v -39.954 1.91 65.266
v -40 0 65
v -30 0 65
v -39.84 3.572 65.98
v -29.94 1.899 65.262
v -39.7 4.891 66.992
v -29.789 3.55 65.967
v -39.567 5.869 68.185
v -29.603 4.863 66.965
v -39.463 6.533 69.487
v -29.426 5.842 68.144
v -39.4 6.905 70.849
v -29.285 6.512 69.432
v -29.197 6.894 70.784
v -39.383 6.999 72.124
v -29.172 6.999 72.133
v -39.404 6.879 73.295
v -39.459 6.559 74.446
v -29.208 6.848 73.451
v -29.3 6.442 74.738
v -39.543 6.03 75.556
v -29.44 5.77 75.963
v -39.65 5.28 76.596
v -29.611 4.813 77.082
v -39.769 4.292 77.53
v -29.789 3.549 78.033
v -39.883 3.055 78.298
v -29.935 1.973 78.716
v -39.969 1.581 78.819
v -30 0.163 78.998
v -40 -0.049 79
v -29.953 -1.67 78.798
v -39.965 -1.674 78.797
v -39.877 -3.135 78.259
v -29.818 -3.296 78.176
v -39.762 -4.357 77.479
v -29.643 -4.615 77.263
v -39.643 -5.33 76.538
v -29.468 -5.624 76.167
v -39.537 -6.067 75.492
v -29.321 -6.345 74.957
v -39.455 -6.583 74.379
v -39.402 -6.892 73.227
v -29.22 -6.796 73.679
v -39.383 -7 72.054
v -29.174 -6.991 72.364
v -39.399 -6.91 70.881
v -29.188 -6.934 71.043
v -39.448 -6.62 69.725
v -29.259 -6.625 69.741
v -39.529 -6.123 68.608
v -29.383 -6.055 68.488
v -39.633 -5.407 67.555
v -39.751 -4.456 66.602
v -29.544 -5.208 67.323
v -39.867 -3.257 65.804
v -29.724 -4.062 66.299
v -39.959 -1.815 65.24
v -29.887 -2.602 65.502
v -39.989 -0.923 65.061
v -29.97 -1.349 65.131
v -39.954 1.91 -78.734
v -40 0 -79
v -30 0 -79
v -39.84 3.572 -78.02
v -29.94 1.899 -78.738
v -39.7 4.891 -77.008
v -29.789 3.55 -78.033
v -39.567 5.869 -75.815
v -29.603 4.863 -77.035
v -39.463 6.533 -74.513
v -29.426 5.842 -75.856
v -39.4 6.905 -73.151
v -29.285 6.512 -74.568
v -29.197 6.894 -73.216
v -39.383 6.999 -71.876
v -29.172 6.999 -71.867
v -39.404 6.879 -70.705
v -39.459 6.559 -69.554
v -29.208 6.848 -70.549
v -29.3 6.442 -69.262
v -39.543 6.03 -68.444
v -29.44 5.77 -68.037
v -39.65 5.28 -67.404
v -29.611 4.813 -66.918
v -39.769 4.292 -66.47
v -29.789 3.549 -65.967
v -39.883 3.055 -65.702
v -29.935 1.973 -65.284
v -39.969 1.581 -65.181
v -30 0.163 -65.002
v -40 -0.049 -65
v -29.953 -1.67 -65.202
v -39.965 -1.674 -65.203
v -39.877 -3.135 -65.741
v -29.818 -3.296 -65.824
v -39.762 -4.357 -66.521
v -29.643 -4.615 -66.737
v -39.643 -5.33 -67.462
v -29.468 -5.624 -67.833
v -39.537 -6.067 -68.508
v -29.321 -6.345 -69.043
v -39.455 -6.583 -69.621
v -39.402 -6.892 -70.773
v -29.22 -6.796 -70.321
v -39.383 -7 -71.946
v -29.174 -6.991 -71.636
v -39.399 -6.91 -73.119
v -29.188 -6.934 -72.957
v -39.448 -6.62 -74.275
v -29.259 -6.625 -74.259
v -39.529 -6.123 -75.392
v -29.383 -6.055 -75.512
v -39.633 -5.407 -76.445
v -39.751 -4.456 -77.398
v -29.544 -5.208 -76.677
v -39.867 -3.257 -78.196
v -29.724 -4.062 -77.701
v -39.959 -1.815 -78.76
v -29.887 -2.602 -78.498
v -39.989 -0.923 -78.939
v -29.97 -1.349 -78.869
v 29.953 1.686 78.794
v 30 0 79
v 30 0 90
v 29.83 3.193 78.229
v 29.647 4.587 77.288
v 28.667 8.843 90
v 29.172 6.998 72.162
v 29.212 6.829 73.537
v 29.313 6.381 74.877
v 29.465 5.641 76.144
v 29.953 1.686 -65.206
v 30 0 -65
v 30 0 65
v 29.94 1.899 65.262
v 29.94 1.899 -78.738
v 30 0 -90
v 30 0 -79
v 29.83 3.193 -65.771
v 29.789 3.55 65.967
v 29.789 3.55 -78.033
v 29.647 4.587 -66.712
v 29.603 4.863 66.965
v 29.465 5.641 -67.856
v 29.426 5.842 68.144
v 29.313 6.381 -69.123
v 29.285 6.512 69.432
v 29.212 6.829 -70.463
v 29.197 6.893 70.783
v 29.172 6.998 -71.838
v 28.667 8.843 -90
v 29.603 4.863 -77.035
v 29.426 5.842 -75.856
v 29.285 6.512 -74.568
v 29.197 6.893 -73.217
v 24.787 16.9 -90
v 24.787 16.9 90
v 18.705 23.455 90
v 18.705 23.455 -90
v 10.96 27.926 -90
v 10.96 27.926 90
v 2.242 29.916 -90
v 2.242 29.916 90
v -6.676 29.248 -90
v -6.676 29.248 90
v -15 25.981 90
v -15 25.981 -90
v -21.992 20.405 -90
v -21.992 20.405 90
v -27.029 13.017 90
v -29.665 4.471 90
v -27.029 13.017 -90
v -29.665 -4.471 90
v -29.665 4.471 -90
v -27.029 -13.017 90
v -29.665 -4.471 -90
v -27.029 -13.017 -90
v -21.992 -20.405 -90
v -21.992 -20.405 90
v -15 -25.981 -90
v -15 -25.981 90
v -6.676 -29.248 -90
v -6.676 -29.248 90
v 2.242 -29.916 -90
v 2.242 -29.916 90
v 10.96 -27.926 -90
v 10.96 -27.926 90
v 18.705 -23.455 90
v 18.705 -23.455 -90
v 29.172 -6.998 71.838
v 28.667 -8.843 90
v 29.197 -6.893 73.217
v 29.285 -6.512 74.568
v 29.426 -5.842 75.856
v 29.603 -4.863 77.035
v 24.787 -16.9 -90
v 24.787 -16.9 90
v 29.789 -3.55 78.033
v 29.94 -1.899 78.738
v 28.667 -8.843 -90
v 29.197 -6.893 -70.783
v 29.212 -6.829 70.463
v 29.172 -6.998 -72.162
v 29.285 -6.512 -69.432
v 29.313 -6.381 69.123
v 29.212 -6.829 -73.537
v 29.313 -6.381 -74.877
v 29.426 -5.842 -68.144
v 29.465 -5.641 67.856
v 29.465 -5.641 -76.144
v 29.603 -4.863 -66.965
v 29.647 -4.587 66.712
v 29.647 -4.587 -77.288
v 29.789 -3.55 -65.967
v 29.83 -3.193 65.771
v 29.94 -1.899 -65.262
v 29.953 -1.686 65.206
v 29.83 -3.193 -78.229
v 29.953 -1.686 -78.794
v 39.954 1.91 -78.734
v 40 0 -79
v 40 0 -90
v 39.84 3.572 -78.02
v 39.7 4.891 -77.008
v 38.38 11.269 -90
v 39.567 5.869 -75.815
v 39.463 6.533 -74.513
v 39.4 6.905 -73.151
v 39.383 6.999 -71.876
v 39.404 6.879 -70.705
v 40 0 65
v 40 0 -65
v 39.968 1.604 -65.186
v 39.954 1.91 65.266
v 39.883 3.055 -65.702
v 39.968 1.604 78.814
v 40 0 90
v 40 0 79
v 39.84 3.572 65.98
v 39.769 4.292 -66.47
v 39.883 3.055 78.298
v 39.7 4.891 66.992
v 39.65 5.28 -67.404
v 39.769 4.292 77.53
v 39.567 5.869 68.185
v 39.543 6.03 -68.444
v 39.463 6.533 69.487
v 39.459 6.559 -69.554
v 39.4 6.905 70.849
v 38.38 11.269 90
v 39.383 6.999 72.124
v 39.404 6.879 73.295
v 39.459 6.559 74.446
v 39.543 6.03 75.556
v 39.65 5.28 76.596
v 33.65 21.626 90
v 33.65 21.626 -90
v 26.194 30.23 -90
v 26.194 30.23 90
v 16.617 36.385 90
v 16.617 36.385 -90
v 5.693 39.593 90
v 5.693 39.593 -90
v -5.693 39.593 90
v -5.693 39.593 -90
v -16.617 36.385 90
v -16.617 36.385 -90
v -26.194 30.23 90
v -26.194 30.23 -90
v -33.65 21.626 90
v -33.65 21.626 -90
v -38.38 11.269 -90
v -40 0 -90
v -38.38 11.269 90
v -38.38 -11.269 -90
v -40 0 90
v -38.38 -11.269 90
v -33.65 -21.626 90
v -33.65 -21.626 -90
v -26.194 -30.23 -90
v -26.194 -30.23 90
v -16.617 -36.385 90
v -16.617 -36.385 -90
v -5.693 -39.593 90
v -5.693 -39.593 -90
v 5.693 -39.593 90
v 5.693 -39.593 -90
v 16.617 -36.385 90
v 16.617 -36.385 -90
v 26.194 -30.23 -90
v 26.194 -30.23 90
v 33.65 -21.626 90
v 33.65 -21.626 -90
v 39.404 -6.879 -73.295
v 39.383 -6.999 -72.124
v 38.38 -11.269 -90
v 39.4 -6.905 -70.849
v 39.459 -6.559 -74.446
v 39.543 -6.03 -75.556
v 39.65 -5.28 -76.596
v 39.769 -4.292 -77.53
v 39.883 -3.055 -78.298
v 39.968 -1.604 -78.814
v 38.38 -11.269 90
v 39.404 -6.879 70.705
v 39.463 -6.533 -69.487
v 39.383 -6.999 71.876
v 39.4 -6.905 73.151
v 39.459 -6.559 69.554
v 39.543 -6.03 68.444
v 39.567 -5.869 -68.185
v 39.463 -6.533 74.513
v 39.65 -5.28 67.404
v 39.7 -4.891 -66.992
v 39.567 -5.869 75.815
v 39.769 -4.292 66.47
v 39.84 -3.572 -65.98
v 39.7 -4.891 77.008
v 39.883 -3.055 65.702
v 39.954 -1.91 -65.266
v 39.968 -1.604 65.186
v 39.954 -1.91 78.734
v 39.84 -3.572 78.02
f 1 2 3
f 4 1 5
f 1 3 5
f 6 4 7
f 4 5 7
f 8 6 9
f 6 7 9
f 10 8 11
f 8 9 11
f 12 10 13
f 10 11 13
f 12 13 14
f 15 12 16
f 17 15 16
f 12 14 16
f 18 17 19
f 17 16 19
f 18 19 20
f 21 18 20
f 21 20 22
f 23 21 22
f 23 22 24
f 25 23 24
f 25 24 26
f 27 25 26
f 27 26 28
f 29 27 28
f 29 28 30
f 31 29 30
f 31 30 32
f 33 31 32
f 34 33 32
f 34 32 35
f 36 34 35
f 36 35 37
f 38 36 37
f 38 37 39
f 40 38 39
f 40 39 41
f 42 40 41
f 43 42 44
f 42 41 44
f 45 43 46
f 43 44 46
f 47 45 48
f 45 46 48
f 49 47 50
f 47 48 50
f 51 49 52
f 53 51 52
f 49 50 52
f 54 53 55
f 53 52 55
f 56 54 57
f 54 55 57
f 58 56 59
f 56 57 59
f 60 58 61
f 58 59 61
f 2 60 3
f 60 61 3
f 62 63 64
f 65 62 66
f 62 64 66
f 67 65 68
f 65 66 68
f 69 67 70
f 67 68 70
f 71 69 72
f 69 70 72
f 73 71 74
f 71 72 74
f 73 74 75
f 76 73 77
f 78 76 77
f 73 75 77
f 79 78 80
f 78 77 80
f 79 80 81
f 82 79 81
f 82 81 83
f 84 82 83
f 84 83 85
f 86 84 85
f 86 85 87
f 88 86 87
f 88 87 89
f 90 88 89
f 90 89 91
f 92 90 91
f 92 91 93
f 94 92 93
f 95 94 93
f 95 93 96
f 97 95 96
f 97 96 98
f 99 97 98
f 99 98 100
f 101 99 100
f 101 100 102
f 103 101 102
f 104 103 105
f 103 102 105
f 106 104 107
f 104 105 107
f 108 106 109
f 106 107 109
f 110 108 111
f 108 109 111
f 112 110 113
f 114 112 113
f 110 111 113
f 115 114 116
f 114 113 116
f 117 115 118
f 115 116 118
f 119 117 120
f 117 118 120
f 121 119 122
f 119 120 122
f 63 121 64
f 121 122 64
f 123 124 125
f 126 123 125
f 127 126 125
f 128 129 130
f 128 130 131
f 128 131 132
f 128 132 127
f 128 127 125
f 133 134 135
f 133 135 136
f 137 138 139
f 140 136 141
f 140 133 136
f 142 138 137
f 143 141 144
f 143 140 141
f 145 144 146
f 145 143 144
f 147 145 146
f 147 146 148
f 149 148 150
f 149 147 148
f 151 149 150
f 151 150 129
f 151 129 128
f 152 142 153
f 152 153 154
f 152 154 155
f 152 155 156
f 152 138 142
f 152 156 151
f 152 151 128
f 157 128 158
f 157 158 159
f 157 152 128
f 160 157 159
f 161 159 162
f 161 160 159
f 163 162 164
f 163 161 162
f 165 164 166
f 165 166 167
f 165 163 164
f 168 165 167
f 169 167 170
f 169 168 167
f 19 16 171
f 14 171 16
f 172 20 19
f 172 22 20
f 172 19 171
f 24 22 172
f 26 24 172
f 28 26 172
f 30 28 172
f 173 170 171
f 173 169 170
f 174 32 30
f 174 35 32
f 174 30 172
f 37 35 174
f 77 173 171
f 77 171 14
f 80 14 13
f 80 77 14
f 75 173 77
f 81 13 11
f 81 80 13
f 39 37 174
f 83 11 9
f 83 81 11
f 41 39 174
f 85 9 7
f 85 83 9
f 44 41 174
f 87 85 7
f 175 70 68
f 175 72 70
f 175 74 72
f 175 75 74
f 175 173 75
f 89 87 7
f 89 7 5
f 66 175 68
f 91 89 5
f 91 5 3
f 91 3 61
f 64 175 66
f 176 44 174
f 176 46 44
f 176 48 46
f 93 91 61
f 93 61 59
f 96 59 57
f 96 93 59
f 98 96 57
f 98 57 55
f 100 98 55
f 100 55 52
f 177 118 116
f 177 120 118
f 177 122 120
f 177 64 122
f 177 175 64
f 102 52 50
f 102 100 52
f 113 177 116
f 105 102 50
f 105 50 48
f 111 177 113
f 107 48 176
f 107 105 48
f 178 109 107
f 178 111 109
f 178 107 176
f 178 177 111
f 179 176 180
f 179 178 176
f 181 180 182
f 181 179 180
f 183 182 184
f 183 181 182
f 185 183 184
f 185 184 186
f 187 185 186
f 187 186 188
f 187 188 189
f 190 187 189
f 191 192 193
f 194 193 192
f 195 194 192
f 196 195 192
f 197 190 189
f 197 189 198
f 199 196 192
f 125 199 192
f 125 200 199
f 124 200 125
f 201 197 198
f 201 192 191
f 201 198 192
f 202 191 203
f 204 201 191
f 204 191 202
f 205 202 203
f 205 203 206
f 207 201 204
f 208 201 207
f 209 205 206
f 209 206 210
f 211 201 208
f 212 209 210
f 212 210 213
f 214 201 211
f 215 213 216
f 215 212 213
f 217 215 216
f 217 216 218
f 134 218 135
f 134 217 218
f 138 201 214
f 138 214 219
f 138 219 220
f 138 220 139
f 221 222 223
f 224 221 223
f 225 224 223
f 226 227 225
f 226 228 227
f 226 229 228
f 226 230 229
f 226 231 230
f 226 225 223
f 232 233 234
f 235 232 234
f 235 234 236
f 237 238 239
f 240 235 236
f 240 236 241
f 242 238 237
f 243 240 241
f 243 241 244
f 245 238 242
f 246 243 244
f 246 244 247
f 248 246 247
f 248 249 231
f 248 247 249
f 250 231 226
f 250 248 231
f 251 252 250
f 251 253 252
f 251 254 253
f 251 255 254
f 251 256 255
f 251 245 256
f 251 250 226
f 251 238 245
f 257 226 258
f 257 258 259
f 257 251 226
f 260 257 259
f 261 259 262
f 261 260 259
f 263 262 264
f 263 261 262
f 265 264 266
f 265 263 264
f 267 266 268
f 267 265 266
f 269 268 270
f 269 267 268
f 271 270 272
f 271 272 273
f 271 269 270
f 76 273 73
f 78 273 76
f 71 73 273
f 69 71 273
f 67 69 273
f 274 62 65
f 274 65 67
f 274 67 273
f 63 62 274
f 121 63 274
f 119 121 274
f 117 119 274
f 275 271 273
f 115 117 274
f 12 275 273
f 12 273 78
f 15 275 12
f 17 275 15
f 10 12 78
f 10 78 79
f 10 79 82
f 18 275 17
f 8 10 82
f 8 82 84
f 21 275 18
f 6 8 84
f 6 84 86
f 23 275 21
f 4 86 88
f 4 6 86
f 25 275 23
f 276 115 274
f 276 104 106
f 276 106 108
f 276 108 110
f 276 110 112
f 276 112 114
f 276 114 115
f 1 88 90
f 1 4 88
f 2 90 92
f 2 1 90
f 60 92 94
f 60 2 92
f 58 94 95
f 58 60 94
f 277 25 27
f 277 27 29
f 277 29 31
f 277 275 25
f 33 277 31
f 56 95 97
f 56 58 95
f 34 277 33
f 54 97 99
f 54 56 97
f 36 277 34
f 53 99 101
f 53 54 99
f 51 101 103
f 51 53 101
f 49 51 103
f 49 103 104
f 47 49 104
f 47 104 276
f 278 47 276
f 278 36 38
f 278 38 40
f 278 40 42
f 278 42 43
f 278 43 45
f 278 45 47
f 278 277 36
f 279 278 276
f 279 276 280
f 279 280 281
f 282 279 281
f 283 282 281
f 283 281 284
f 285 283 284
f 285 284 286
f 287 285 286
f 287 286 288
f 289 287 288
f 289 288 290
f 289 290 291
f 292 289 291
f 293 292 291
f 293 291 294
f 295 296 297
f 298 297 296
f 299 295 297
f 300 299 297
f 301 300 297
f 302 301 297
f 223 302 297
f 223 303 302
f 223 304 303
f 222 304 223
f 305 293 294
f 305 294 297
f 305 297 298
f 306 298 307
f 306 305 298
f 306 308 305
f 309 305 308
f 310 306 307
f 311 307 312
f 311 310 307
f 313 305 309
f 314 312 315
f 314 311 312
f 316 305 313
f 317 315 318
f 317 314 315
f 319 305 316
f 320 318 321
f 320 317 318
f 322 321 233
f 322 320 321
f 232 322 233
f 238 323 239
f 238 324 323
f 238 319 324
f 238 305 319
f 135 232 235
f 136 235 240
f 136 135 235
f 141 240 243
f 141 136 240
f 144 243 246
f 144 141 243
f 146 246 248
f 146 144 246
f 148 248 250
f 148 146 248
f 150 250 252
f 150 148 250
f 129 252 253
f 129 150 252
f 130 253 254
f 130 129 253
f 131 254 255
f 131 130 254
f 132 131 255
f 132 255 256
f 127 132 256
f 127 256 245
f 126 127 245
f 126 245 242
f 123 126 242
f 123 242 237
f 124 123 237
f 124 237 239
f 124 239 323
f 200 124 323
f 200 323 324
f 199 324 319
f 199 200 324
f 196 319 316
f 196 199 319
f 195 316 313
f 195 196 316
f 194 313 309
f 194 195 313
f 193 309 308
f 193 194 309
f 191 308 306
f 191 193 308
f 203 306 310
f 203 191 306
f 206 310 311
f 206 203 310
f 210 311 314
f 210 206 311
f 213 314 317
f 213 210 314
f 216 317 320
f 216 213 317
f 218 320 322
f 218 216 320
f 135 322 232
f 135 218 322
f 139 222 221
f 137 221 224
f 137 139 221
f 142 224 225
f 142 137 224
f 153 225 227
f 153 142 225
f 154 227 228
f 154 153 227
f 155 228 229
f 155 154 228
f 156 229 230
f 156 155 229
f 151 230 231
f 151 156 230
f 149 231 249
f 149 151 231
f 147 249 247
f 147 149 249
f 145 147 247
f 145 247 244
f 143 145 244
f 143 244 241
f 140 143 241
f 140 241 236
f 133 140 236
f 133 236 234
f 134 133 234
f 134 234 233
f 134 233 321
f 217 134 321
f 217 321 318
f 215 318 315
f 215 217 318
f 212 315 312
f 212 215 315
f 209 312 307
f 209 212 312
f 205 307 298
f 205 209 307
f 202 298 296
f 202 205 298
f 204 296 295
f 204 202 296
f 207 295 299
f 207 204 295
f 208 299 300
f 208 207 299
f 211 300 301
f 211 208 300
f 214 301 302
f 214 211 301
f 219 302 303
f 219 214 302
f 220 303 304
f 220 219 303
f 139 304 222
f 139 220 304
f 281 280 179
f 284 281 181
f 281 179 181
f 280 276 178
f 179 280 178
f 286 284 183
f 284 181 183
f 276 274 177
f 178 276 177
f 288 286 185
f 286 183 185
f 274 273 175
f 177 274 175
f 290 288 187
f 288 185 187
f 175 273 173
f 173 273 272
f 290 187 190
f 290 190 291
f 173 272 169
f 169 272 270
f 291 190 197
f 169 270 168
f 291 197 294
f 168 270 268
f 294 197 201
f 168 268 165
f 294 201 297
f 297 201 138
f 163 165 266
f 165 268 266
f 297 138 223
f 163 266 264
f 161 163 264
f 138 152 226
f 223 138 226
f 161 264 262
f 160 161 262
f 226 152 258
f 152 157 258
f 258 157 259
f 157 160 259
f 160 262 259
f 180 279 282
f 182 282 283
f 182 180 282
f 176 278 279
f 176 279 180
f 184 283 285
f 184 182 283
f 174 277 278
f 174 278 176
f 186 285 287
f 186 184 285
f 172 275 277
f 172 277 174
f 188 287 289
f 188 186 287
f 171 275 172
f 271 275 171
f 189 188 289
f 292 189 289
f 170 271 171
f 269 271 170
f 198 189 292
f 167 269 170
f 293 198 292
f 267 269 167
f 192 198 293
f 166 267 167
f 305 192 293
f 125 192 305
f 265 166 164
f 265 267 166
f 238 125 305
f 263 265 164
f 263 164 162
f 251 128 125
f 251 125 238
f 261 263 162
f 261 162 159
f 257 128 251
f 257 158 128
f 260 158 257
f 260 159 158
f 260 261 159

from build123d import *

# Parameters (mm, degrees)
SKETCH1_R               = 40
SKETCH1_R_2             = 30
BOSS_EXTRUDE1_DEPTH     = 90
SKETCH2_R               = 7
CUT_EXTRUDE1_DEPTH      = 41
CUT_EXTRUDE1_DEPTH_BACK = 41


with BuildPart() as part:
    # Sketch1 → Boss-Extrude1 (new body, symmetric)
    with BuildSketch(Plane.XY):
        Circle(SKETCH1_R)
        Circle(SKETCH1_R_2, mode=Mode.SUBTRACT)
    extrude(amount=BOSS_EXTRUDE1_DEPTH, both=True)

    # Sketch2 → Cut-Extrude1 (cut, two sides)
    with BuildSketch(Plane(origin=(0, 0, 0), x_dir=(0, 0, -1), z_dir=(1, 0, 0))) as cut_extrude1_sk:
        with Locations((-72, 0)):
            Circle(SKETCH2_R)
        with Locations((72, 0)):
            Circle(SKETCH2_R)
    extrude(amount=CUT_EXTRUDE1_DEPTH, mode=Mode.SUBTRACT)
    extrude(cut_extrude1_sk.sketch, amount=-CUT_EXTRUDE1_DEPTH_BACK, mode=Mode.SUBTRACT)


solid = part.part
